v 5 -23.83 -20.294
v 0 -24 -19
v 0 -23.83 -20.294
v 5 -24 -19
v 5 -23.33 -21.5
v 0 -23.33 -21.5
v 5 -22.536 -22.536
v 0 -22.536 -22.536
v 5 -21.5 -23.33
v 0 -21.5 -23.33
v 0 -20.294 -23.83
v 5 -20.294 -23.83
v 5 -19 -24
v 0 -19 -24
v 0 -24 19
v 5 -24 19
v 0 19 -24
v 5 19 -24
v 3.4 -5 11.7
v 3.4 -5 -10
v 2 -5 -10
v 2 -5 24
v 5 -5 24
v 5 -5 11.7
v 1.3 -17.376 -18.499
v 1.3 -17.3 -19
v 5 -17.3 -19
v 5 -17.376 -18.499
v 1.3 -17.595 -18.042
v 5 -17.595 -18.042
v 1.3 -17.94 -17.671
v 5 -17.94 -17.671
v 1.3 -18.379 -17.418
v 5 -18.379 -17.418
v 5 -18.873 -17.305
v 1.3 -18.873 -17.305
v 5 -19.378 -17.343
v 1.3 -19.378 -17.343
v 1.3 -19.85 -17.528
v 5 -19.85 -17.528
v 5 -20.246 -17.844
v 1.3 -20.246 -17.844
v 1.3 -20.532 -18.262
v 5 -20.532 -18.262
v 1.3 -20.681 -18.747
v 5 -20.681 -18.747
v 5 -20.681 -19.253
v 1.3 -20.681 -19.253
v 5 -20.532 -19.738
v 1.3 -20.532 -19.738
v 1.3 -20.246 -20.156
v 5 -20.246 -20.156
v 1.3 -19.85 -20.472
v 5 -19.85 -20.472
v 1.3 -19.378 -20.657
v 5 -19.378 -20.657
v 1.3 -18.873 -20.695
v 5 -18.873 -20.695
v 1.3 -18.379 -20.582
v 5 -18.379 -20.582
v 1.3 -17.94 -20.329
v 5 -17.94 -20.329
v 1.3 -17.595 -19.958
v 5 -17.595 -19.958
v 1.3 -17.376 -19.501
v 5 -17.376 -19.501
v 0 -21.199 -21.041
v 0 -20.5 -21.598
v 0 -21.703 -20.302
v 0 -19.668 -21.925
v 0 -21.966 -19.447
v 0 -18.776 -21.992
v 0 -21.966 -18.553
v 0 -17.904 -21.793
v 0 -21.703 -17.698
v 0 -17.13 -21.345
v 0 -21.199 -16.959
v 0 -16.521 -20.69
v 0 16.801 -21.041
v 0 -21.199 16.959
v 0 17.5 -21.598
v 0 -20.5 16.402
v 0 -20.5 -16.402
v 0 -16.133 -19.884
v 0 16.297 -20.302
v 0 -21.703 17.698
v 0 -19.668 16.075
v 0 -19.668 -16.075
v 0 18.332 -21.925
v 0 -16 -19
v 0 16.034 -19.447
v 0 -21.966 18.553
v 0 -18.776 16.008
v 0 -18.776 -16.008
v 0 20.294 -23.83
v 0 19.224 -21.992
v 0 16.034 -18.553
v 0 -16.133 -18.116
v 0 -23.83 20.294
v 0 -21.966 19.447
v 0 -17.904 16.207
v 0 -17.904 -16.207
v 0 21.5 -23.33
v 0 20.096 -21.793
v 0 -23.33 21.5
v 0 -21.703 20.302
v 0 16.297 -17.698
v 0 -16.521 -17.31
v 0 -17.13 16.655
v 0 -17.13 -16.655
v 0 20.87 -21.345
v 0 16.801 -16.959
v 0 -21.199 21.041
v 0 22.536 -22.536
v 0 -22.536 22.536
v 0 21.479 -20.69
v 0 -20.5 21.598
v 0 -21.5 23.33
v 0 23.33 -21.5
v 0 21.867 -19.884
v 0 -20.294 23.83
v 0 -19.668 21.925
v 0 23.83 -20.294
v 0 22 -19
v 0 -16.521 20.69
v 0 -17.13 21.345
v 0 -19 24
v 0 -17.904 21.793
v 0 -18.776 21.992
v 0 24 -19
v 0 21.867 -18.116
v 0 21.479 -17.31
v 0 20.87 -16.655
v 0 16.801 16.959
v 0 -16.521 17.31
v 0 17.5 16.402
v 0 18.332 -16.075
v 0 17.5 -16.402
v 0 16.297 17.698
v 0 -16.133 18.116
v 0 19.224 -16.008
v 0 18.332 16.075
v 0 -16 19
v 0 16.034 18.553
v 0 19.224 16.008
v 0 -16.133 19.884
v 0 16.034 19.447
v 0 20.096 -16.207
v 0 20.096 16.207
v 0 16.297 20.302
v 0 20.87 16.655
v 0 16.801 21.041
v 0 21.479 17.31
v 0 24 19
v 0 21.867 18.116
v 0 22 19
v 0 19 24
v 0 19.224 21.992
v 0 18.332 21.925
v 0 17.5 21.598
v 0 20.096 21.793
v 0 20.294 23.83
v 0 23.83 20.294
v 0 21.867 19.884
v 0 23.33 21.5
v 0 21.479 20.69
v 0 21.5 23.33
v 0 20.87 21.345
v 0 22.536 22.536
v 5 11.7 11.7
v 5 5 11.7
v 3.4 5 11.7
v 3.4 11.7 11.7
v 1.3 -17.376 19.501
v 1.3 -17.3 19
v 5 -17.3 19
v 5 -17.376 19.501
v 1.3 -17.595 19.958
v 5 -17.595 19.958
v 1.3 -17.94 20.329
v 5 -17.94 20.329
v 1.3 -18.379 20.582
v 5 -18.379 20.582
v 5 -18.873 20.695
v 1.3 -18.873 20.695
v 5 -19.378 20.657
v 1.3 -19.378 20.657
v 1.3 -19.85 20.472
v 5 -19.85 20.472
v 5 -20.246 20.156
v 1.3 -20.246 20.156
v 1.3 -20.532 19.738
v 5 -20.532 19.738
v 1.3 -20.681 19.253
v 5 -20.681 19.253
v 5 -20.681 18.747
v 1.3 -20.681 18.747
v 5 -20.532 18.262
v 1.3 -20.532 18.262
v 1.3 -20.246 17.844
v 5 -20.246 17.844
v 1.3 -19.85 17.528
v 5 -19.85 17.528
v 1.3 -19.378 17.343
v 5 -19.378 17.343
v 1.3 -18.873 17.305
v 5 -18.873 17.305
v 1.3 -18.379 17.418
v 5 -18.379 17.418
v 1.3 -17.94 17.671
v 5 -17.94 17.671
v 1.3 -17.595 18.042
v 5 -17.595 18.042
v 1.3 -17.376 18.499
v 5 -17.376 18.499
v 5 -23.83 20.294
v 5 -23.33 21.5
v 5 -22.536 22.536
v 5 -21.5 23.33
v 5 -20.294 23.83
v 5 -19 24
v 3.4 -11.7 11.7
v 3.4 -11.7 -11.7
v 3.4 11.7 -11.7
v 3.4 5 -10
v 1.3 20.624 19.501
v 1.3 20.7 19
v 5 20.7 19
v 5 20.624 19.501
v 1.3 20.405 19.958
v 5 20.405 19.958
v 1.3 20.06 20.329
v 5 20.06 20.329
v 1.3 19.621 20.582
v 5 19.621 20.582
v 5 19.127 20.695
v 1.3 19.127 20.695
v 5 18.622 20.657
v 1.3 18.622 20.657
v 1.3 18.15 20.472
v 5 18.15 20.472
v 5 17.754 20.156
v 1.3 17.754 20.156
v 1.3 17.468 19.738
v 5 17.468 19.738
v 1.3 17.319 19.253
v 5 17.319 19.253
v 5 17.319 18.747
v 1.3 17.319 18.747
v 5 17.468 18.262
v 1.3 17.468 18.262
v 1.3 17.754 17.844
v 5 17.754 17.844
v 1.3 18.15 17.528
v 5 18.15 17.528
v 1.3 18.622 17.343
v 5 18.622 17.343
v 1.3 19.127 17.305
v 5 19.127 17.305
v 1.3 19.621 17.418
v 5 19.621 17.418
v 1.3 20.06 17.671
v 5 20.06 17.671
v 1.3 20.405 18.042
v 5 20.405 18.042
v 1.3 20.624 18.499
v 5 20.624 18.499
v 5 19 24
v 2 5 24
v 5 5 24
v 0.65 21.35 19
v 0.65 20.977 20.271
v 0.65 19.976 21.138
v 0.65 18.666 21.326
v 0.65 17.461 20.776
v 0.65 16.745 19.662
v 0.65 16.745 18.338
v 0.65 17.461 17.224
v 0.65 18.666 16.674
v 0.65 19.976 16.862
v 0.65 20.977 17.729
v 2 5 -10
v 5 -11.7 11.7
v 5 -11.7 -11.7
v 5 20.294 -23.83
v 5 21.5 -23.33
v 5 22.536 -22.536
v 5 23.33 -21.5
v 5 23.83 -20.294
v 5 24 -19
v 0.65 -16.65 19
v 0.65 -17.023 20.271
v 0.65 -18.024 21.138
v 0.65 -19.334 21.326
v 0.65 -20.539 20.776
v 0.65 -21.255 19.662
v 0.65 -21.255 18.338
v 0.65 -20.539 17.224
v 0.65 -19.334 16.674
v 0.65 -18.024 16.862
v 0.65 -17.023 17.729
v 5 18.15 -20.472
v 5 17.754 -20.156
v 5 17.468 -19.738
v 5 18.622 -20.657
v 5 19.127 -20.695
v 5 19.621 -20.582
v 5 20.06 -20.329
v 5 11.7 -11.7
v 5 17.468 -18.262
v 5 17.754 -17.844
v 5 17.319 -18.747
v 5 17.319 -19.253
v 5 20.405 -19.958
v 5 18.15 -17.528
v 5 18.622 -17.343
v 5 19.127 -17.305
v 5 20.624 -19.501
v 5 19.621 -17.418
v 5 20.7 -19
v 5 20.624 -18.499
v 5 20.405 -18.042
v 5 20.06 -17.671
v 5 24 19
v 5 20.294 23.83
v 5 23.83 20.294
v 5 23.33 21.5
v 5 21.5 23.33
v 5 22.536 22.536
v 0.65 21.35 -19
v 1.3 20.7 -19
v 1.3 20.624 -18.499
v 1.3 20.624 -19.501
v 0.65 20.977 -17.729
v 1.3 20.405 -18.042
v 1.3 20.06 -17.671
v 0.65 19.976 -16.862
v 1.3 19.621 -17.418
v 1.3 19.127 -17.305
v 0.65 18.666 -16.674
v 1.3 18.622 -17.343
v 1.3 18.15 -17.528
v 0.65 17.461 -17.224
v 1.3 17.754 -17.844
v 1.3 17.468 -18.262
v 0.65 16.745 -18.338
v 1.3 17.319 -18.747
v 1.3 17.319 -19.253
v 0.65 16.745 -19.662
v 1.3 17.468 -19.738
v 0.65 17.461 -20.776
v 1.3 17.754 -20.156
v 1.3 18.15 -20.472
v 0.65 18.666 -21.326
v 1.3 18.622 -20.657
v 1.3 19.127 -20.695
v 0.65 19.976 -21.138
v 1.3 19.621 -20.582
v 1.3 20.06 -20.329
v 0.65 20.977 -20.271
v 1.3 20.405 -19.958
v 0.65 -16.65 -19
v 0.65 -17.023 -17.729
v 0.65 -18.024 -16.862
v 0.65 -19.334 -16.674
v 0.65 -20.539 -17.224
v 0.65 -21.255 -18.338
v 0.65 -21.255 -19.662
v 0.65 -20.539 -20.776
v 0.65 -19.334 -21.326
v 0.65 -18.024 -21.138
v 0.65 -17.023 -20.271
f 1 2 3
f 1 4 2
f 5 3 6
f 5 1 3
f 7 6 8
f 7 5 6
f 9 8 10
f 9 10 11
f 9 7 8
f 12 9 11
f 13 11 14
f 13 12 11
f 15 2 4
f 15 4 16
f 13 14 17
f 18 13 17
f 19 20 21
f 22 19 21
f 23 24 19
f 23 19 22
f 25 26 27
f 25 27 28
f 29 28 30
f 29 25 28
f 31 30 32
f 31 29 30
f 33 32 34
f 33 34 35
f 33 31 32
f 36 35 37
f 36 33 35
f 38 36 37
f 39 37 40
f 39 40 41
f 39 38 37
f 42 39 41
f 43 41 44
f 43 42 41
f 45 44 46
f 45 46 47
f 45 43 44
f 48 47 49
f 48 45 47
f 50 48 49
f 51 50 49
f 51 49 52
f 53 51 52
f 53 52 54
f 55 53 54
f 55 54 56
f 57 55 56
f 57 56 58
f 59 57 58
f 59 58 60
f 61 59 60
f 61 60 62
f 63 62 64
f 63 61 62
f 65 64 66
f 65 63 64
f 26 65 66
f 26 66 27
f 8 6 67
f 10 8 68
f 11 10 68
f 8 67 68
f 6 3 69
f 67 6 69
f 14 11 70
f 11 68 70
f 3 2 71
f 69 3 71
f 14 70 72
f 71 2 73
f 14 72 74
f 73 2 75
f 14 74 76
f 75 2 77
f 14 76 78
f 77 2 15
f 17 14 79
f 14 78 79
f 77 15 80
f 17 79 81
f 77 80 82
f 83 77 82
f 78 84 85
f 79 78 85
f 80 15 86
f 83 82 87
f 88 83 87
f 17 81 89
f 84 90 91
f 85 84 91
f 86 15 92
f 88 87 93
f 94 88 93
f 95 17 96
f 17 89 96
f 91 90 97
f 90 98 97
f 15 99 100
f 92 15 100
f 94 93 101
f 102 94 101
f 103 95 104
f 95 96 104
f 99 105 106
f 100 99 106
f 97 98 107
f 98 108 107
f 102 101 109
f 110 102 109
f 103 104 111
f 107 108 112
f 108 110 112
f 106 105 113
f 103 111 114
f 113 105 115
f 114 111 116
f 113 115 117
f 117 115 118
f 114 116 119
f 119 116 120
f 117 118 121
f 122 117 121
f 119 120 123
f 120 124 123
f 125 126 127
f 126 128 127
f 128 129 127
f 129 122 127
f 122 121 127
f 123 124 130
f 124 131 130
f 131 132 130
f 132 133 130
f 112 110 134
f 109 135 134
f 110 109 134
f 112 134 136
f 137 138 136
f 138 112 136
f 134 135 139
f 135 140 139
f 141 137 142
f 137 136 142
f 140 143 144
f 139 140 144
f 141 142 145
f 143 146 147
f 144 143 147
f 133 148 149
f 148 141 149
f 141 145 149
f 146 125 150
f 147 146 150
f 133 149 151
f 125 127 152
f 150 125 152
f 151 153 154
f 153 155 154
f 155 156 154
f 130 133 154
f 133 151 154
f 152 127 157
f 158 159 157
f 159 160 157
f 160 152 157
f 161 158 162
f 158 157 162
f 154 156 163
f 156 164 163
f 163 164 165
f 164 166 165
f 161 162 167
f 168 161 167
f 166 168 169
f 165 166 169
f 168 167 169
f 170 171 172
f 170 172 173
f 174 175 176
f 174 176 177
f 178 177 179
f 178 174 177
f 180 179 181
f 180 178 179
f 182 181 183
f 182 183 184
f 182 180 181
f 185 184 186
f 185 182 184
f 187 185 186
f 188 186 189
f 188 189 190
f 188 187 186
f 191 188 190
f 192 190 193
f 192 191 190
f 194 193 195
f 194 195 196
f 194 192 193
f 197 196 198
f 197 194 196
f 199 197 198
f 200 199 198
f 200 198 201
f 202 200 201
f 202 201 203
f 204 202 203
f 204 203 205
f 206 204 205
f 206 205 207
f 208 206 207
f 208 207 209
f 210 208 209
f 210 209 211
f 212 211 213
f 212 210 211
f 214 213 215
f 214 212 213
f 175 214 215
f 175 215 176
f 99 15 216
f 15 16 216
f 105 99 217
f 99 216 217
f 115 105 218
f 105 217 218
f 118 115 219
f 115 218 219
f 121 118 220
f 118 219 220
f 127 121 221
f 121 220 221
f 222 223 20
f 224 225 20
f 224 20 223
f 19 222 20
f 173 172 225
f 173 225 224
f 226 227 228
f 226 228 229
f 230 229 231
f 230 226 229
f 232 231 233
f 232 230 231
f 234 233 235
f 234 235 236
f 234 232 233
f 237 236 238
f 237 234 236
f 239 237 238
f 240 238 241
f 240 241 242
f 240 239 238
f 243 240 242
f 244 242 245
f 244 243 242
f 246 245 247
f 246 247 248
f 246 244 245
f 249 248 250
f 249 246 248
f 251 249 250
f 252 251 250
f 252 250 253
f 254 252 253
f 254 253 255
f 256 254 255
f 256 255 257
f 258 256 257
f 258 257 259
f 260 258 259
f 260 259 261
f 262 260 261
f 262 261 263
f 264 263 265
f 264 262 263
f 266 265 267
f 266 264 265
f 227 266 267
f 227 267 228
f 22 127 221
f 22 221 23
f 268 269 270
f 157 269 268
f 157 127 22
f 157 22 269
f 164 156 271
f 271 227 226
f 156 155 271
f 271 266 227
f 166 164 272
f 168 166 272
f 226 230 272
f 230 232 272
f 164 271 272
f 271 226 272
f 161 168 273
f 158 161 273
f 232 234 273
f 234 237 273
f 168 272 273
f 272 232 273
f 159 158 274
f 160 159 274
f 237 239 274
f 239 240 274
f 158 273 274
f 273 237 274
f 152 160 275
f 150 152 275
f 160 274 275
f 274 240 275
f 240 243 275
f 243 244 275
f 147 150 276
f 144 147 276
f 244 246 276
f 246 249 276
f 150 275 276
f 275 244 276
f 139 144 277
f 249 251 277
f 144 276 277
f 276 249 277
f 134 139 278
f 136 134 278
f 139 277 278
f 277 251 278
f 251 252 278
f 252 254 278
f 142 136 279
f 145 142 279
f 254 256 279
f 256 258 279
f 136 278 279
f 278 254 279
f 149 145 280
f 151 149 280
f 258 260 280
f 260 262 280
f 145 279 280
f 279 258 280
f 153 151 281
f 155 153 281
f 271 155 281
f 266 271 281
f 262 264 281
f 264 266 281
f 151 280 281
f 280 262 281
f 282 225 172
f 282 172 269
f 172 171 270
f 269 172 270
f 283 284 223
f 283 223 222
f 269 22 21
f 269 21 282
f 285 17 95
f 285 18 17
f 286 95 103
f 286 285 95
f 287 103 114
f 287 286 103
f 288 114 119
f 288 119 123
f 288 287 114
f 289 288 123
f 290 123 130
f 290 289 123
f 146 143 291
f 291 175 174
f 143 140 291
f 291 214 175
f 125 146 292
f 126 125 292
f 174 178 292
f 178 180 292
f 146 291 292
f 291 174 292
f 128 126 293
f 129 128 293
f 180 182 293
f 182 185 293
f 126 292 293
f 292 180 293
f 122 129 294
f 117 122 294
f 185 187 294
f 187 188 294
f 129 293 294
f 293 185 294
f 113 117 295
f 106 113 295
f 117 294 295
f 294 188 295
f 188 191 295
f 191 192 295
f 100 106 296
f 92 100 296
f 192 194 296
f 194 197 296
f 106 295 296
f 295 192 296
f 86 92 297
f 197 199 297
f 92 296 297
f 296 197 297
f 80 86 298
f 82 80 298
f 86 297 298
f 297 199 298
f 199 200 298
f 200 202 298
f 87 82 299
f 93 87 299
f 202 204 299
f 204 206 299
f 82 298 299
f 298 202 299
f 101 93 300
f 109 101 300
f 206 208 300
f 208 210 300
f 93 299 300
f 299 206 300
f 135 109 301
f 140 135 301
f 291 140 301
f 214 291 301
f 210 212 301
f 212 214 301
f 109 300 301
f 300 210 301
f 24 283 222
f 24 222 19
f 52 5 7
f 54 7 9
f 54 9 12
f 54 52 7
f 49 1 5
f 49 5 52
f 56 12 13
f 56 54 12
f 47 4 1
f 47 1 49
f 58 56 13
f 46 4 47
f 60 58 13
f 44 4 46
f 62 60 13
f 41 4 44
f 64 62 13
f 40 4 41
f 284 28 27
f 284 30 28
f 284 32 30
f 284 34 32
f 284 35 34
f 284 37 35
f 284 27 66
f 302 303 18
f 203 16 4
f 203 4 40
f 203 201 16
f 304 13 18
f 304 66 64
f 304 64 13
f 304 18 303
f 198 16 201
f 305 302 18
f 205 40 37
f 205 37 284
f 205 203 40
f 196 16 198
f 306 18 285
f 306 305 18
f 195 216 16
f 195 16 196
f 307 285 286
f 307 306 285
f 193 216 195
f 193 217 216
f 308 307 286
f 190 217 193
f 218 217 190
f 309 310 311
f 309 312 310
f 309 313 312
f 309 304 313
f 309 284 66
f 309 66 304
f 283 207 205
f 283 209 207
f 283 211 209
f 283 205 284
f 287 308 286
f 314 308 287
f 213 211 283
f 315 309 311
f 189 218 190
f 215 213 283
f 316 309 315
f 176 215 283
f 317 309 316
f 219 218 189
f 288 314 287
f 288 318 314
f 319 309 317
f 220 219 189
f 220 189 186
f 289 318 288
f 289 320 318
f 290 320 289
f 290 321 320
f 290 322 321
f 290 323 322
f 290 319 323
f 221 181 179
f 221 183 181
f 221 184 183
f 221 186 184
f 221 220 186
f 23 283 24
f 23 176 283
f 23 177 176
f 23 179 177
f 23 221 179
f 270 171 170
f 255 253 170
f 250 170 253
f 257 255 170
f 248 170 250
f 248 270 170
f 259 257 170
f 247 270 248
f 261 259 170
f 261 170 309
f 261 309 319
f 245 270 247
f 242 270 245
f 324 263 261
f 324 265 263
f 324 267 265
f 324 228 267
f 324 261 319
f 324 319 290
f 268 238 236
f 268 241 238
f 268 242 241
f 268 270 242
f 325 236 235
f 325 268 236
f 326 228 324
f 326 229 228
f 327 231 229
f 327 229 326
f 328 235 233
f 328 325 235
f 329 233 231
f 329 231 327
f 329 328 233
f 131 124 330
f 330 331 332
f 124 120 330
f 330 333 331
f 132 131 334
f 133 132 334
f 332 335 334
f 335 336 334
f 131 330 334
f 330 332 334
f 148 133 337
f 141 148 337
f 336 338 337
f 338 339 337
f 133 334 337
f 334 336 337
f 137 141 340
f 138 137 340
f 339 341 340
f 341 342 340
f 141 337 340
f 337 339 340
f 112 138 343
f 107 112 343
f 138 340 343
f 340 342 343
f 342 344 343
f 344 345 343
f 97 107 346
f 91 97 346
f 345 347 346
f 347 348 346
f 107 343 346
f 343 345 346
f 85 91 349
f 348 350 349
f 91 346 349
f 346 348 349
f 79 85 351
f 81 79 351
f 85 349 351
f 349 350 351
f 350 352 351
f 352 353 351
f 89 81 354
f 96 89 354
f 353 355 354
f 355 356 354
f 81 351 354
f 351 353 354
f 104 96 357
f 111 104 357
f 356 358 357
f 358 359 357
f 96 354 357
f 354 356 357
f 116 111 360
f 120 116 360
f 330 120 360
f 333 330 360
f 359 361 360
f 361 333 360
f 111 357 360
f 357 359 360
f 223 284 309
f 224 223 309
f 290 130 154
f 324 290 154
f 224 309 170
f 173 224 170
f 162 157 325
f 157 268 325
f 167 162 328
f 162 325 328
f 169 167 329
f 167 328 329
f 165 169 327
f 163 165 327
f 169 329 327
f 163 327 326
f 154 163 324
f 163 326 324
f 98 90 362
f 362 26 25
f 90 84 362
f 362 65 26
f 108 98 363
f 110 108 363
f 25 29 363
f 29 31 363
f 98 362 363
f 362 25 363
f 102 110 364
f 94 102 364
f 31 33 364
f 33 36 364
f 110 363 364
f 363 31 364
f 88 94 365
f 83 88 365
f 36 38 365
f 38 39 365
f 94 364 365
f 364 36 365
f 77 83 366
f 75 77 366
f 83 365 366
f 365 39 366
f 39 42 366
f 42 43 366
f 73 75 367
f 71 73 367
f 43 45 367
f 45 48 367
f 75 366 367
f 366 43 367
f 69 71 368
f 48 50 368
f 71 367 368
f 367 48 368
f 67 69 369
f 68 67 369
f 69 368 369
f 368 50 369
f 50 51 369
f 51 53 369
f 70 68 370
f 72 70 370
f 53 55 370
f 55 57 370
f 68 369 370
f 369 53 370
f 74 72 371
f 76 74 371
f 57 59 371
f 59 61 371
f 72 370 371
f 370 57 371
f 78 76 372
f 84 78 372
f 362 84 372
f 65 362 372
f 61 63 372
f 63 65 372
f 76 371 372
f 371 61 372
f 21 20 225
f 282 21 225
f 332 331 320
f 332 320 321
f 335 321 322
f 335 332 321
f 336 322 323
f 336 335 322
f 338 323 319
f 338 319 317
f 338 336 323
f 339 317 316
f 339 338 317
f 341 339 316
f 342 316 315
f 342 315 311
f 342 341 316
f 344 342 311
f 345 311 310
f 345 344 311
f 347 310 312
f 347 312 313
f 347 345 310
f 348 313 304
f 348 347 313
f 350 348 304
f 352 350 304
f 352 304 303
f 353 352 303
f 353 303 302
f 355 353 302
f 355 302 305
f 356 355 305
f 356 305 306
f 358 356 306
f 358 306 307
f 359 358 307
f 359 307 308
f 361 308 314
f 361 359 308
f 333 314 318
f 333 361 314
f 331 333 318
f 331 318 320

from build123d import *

# Parameters (mm, degrees)
SKETCH105_W     = 48
SKETCH105_H     = 48
SKETCH105_R     = 1.7
PAD082_DEPTH    = 5
SKETCH106_W     = 10
SKETCH106_H     = 50
POCKET012_DEPTH = 3
SKETCH107_W     = 23.4
SKETCH107_H     = 23.4
POCKET013_DEPTH = 1.6
FILLET012_R     = 5
CHAMFER_ANGLE   = 45
CHAMFER_SIZE    = 1.3


with BuildPart() as part:
    # Sketch105 → Pad082 (new body)
    with BuildSketch(Plane.YZ):
        Rectangle(SKETCH105_W, SKETCH105_H)
        with Locations((19, 19)):
            Circle(SKETCH105_R, mode=Mode.SUBTRACT)
        with Locations((19, -19)):
            Circle(SKETCH105_R, mode=Mode.SUBTRACT)
        with Locations((-19, 19)):
            Circle(SKETCH105_R, mode=Mode.SUBTRACT)
        with Locations((-19, -19)):
            Circle(SKETCH105_R, mode=Mode.SUBTRACT)
    extrude(amount=PAD082_DEPTH)

    # Sketch106 (on DatumPlane) → Pocket012 (cut)
    with BuildSketch(Plane.YZ.offset(5)):
        with Locations((0, 15)):
            Rectangle(SKETCH106_W, SKETCH106_H)
    extrude(amount=-POCKET012_DEPTH, mode=Mode.SUBTRACT)

    # Sketch107 (on DatumPlane) → Pocket013 (cut)
    with BuildSketch(Plane.YZ.offset(5)):
        Rectangle(SKETCH107_W, SKETCH107_H)
    extrude(amount=-POCKET013_DEPTH, mode=Mode.SUBTRACT)

    # Fillet012
    fillet012_edges = [part.edges().sort_by_distance(p)[0] for p in [
        (2.5, 24, 24),
        (2.5, -24, 24),
        (2.5, -24, -24),
        (2.5, 24, -24),
    ]]
    fillet(fillet012_edges, radius=FILLET012_R)

    # Chamfer
    chamfer_edges = [part.edges().sort_by_distance(p)[0] for p in [
        (0, 17.3, 19),
        (0, -20.7, 19),
        (0, 17.3, -19),
        (0, -20.7, -19),
    ]]
    chamfer_side = part.faces().sort_by_distance((0, 0, 0))[0]
    chamfer(chamfer_edges, length=CHAMFER_SIZE, angle=CHAMFER_ANGLE, reference=chamfer_side)


solid = part.part
